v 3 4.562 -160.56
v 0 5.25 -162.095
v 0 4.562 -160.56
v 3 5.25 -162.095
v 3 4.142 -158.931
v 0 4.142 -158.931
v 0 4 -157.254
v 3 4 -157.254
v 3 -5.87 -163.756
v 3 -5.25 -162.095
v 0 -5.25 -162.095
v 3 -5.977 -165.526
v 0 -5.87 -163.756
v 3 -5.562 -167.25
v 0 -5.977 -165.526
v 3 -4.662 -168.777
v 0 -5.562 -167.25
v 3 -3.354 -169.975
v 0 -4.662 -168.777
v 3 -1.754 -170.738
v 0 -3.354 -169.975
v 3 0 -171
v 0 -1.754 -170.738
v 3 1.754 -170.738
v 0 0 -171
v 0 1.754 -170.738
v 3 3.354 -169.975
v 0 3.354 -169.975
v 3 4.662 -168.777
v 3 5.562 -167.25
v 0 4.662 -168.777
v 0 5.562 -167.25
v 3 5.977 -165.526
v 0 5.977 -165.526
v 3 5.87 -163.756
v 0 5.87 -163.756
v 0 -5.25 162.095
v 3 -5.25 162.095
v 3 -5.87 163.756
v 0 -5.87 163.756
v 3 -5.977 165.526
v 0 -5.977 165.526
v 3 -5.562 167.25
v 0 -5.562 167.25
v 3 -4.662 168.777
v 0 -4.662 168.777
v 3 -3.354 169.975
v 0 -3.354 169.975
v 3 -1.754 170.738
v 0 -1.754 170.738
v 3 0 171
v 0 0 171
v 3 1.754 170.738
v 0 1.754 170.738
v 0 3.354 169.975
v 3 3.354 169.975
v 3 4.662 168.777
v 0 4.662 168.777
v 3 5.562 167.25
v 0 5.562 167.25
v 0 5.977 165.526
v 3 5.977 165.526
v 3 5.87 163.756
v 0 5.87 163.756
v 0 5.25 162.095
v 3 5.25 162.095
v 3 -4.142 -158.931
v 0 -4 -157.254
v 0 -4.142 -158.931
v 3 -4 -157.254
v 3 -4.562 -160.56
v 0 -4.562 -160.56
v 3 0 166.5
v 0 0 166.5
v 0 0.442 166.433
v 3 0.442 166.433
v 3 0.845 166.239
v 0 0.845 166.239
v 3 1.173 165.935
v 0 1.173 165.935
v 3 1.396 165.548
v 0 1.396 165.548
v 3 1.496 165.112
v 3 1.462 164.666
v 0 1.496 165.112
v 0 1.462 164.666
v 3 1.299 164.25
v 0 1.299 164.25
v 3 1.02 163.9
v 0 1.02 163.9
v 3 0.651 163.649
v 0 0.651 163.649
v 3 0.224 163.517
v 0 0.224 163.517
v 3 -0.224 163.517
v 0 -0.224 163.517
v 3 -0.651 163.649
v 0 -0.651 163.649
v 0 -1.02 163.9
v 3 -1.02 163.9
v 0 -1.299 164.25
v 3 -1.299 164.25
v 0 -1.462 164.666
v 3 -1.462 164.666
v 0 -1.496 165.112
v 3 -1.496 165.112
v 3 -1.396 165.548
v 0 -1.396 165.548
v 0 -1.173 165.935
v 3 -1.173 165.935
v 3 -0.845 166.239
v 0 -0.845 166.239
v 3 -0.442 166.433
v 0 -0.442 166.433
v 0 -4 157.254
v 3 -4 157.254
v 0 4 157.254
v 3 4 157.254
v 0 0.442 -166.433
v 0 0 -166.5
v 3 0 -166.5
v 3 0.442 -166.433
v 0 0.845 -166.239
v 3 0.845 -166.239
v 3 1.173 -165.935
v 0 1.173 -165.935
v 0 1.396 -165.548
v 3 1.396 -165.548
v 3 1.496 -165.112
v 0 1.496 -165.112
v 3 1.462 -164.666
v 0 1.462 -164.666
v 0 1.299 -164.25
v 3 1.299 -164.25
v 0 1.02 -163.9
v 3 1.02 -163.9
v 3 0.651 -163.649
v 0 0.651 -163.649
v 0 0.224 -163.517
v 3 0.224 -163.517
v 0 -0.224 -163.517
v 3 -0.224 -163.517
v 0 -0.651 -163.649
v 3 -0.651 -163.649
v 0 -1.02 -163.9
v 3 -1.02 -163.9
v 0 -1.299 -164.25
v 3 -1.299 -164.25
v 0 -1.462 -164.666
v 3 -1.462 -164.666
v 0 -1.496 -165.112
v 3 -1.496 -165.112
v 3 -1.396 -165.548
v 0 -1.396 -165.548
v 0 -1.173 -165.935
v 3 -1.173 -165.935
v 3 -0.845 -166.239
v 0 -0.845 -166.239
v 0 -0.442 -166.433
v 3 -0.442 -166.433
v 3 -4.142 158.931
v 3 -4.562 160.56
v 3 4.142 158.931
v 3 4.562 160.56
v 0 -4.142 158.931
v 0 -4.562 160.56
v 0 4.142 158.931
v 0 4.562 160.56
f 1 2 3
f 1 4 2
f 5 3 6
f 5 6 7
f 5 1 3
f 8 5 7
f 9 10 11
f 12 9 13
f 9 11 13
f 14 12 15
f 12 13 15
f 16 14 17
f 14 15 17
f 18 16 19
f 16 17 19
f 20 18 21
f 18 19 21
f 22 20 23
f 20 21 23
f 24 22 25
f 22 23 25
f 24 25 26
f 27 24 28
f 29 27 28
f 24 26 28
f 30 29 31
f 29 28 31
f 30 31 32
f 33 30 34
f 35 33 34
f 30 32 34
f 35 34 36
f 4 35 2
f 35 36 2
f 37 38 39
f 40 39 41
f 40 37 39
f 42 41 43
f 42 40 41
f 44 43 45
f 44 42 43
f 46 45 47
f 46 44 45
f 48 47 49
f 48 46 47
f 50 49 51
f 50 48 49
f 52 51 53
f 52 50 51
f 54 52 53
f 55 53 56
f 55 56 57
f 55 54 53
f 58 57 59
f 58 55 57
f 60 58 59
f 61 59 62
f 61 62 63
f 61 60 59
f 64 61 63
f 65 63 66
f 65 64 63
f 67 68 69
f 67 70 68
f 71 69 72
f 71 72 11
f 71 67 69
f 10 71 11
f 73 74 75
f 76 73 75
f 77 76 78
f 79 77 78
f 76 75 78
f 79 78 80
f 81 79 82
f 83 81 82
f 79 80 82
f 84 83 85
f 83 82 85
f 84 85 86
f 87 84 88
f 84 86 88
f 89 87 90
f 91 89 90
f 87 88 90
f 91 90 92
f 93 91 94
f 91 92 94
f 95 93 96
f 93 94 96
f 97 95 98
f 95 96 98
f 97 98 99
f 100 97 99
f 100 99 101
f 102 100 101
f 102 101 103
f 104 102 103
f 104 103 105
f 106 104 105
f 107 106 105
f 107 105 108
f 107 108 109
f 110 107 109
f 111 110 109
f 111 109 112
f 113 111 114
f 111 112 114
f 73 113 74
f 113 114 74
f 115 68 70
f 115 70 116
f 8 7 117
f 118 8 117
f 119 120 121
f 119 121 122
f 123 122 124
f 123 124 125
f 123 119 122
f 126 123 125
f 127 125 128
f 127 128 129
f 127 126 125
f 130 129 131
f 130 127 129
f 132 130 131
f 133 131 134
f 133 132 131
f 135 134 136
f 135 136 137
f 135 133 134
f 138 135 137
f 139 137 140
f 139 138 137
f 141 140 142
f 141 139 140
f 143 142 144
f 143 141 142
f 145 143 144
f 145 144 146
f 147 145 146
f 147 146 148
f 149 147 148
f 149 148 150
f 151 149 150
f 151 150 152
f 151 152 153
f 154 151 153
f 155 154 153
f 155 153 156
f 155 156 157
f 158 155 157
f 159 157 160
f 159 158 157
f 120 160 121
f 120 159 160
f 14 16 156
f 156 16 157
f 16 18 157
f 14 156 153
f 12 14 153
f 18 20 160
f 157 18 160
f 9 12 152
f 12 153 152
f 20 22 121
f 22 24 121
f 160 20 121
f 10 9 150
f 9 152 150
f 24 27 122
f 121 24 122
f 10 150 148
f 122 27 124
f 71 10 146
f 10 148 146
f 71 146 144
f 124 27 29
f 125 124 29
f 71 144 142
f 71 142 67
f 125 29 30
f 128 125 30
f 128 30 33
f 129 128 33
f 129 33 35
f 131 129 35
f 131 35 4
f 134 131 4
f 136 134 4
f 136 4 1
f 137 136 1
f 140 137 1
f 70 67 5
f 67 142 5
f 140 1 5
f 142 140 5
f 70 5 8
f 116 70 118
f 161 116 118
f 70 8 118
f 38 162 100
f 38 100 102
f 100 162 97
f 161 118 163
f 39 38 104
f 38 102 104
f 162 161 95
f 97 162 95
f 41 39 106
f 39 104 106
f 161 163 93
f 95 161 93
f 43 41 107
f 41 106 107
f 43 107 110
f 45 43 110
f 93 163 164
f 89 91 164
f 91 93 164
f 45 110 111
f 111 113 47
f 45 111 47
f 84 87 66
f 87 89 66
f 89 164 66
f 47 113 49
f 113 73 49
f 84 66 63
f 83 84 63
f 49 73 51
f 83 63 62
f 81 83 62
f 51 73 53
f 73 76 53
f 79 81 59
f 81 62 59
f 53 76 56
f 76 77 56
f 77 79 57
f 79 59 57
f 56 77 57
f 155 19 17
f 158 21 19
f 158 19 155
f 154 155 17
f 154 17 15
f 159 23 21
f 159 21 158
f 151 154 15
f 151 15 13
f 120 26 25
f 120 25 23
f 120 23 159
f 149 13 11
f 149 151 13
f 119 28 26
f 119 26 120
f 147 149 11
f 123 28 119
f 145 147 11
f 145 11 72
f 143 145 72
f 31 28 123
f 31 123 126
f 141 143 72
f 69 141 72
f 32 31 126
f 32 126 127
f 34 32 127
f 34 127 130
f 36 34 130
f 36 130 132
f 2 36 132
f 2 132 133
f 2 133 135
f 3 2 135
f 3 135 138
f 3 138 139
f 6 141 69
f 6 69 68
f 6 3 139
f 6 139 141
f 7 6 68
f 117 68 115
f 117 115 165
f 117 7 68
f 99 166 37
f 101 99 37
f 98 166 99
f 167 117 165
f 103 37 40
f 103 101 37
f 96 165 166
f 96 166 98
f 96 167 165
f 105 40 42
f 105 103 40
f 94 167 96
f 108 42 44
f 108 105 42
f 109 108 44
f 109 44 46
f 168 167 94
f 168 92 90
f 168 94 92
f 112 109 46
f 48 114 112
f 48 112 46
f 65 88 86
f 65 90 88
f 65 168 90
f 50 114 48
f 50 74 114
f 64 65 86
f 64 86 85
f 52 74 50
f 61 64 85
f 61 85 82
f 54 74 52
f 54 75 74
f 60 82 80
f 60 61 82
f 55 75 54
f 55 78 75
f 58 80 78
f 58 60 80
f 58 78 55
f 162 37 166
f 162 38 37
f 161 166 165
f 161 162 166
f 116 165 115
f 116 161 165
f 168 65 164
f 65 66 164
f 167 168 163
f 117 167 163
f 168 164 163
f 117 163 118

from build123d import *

# Parameters (mm, degrees)
SKETCH1_R           = 6
SKETCH1_R_2         = 1.5
SKETCH1_W           = 160.527864045
SKETCH1_H           = 8
BOSS_EXTRUDE1_DEPTH = 3
FILLET1_R           = 10
FILLET2_R           = 10
FILLET3_R           = 10
FILLET4_R           = 10


with BuildPart() as part:
    # Sketch1 → Boss-Extrude1 (new body)
    # profile 1 of 2: a face of its own
    with BuildSketch(Plane(origin=(0, 0, 0), x_dir=(0, 0, -1), z_dir=(1, 0, 0))):
        with Locations((165, 0)):
            Circle(SKETCH1_R)
        with Locations((165, 0)):
            Circle(SKETCH1_R_2, mode=Mode.SUBTRACT)
    # profile 2 of 2: a face of its own
    with BuildSketch(Plane(origin=(0, 0, 0), x_dir=(0, 0, -1), z_dir=(1, 0, 0))):
        with Locations((80.263932023, 0)):
            Rectangle(SKETCH1_W, SKETCH1_H)
    boss_extrude1 = extrude(amount=BOSS_EXTRUDE1_DEPTH)

    # Mirror1: Boss-Extrude1 across plane
    add(boss_extrude1.mirror(Plane.XY))

    # Fillet1
    fillet1_edges = [part.edges().sort_by_distance(p)[0] for p in [
        (1.5, 4, 160.527864045),
    ]]
    fillet(fillet1_edges, radius=FILLET1_R)

    # Fillet2
    fillet2_edges = [part.edges().sort_by_distance(p)[0] for p in [
        (1.5, -4, 160.527864045),
    ]]
    fillet(fillet2_edges, radius=FILLET2_R)

    # Fillet3
    fillet3_edges = [part.edges().sort_by_distance(p)[0] for p in [
        (1.5, -4, -160.527864045),
    ]]
    fillet(fillet3_edges, radius=FILLET3_R)

    # Fillet4
    fillet4_edges = [part.edges().sort_by_distance(p)[0] for p in [
        (1.5, 4, -160.527864045),
    ]]
    fillet(fillet4_edges, radius=FILLET4_R)


solid = part.part
